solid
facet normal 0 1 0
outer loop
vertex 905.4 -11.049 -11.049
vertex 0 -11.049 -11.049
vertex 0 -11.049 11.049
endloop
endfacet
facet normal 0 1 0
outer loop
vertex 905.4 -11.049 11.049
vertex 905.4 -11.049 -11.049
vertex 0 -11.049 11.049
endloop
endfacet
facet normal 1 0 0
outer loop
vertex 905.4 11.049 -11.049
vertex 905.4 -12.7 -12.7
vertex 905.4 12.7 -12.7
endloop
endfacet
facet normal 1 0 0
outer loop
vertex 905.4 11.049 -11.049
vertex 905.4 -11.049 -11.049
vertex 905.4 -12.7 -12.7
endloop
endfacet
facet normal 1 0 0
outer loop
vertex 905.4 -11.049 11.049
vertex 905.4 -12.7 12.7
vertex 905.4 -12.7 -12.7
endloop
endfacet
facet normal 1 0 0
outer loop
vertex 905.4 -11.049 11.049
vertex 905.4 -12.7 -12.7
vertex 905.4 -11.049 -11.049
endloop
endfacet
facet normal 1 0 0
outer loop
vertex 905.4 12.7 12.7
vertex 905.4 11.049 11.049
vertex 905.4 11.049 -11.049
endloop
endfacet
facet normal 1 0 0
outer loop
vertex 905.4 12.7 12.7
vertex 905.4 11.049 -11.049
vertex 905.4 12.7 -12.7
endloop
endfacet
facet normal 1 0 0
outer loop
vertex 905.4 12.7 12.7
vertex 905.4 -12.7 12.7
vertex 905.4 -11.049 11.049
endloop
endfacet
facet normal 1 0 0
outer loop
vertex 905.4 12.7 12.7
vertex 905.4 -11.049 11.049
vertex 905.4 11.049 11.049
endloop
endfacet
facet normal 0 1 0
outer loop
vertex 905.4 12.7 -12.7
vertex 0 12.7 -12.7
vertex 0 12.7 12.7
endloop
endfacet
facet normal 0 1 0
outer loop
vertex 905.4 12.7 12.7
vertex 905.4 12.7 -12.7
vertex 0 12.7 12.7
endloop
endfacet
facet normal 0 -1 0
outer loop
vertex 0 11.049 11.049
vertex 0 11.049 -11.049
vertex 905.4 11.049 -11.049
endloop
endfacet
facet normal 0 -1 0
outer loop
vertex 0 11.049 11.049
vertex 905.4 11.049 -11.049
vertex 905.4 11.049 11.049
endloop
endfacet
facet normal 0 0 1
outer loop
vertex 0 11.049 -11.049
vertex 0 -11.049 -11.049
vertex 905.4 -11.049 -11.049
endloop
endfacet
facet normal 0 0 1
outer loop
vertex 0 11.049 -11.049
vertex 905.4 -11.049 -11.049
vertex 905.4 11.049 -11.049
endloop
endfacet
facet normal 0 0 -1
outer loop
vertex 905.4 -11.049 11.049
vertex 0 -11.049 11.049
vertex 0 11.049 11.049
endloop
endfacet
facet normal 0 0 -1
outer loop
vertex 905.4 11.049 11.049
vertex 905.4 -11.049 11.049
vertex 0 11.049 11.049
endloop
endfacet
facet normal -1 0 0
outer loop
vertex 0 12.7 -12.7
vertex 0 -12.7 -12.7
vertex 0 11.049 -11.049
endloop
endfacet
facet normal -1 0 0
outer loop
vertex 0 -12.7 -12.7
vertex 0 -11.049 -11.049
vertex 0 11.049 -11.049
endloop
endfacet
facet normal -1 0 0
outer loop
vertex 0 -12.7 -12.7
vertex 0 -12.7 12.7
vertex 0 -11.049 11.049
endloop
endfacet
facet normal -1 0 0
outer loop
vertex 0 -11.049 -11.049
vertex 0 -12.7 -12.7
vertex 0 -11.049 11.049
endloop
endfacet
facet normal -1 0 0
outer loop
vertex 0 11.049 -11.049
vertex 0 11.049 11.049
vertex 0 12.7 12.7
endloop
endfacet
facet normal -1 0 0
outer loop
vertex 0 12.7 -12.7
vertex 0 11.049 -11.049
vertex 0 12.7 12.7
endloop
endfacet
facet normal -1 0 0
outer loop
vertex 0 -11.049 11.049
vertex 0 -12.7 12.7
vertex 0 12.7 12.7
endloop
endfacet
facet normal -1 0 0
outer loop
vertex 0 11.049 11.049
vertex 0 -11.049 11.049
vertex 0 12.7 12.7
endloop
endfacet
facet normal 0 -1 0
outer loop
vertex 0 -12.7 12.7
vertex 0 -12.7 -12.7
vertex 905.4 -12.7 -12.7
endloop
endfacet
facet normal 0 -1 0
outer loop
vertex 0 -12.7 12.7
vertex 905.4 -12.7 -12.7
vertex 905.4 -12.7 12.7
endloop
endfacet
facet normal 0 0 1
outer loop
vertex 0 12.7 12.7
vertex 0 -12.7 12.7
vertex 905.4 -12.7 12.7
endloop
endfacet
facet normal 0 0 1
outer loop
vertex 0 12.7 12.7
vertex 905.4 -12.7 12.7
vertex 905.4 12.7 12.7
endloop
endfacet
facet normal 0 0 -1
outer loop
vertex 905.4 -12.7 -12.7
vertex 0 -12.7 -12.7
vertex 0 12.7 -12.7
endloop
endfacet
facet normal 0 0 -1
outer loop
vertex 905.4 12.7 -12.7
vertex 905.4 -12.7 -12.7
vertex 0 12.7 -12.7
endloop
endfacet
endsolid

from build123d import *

# Parameters (mm, degrees)
SKETCH13_W                                     = 25.4
SKETCH13_H                                     = 25.4
SKETCH13_W_2                                   = 22.098
SKETCH13_H_2                                   = 22.098
AL_TUBE_SQUARE_AL_TUBE_1_SQR_X_0_065_WAL_DEPTH = 905.4


with BuildPart() as part:
    # Sketch13 → Al tube square AL TUBE 1 SQR X 0.065 WALL(1) (new body)
    with BuildSketch(Plane.YZ):
        Rectangle(SKETCH13_W, SKETCH13_H)
        Rectangle(SKETCH13_W_2, SKETCH13_H_2, mode=Mode.SUBTRACT)
    extrude(amount=AL_TUBE_SQUARE_AL_TUBE_1_SQR_X_0_065_WAL_DEPTH)


solid = part.part
